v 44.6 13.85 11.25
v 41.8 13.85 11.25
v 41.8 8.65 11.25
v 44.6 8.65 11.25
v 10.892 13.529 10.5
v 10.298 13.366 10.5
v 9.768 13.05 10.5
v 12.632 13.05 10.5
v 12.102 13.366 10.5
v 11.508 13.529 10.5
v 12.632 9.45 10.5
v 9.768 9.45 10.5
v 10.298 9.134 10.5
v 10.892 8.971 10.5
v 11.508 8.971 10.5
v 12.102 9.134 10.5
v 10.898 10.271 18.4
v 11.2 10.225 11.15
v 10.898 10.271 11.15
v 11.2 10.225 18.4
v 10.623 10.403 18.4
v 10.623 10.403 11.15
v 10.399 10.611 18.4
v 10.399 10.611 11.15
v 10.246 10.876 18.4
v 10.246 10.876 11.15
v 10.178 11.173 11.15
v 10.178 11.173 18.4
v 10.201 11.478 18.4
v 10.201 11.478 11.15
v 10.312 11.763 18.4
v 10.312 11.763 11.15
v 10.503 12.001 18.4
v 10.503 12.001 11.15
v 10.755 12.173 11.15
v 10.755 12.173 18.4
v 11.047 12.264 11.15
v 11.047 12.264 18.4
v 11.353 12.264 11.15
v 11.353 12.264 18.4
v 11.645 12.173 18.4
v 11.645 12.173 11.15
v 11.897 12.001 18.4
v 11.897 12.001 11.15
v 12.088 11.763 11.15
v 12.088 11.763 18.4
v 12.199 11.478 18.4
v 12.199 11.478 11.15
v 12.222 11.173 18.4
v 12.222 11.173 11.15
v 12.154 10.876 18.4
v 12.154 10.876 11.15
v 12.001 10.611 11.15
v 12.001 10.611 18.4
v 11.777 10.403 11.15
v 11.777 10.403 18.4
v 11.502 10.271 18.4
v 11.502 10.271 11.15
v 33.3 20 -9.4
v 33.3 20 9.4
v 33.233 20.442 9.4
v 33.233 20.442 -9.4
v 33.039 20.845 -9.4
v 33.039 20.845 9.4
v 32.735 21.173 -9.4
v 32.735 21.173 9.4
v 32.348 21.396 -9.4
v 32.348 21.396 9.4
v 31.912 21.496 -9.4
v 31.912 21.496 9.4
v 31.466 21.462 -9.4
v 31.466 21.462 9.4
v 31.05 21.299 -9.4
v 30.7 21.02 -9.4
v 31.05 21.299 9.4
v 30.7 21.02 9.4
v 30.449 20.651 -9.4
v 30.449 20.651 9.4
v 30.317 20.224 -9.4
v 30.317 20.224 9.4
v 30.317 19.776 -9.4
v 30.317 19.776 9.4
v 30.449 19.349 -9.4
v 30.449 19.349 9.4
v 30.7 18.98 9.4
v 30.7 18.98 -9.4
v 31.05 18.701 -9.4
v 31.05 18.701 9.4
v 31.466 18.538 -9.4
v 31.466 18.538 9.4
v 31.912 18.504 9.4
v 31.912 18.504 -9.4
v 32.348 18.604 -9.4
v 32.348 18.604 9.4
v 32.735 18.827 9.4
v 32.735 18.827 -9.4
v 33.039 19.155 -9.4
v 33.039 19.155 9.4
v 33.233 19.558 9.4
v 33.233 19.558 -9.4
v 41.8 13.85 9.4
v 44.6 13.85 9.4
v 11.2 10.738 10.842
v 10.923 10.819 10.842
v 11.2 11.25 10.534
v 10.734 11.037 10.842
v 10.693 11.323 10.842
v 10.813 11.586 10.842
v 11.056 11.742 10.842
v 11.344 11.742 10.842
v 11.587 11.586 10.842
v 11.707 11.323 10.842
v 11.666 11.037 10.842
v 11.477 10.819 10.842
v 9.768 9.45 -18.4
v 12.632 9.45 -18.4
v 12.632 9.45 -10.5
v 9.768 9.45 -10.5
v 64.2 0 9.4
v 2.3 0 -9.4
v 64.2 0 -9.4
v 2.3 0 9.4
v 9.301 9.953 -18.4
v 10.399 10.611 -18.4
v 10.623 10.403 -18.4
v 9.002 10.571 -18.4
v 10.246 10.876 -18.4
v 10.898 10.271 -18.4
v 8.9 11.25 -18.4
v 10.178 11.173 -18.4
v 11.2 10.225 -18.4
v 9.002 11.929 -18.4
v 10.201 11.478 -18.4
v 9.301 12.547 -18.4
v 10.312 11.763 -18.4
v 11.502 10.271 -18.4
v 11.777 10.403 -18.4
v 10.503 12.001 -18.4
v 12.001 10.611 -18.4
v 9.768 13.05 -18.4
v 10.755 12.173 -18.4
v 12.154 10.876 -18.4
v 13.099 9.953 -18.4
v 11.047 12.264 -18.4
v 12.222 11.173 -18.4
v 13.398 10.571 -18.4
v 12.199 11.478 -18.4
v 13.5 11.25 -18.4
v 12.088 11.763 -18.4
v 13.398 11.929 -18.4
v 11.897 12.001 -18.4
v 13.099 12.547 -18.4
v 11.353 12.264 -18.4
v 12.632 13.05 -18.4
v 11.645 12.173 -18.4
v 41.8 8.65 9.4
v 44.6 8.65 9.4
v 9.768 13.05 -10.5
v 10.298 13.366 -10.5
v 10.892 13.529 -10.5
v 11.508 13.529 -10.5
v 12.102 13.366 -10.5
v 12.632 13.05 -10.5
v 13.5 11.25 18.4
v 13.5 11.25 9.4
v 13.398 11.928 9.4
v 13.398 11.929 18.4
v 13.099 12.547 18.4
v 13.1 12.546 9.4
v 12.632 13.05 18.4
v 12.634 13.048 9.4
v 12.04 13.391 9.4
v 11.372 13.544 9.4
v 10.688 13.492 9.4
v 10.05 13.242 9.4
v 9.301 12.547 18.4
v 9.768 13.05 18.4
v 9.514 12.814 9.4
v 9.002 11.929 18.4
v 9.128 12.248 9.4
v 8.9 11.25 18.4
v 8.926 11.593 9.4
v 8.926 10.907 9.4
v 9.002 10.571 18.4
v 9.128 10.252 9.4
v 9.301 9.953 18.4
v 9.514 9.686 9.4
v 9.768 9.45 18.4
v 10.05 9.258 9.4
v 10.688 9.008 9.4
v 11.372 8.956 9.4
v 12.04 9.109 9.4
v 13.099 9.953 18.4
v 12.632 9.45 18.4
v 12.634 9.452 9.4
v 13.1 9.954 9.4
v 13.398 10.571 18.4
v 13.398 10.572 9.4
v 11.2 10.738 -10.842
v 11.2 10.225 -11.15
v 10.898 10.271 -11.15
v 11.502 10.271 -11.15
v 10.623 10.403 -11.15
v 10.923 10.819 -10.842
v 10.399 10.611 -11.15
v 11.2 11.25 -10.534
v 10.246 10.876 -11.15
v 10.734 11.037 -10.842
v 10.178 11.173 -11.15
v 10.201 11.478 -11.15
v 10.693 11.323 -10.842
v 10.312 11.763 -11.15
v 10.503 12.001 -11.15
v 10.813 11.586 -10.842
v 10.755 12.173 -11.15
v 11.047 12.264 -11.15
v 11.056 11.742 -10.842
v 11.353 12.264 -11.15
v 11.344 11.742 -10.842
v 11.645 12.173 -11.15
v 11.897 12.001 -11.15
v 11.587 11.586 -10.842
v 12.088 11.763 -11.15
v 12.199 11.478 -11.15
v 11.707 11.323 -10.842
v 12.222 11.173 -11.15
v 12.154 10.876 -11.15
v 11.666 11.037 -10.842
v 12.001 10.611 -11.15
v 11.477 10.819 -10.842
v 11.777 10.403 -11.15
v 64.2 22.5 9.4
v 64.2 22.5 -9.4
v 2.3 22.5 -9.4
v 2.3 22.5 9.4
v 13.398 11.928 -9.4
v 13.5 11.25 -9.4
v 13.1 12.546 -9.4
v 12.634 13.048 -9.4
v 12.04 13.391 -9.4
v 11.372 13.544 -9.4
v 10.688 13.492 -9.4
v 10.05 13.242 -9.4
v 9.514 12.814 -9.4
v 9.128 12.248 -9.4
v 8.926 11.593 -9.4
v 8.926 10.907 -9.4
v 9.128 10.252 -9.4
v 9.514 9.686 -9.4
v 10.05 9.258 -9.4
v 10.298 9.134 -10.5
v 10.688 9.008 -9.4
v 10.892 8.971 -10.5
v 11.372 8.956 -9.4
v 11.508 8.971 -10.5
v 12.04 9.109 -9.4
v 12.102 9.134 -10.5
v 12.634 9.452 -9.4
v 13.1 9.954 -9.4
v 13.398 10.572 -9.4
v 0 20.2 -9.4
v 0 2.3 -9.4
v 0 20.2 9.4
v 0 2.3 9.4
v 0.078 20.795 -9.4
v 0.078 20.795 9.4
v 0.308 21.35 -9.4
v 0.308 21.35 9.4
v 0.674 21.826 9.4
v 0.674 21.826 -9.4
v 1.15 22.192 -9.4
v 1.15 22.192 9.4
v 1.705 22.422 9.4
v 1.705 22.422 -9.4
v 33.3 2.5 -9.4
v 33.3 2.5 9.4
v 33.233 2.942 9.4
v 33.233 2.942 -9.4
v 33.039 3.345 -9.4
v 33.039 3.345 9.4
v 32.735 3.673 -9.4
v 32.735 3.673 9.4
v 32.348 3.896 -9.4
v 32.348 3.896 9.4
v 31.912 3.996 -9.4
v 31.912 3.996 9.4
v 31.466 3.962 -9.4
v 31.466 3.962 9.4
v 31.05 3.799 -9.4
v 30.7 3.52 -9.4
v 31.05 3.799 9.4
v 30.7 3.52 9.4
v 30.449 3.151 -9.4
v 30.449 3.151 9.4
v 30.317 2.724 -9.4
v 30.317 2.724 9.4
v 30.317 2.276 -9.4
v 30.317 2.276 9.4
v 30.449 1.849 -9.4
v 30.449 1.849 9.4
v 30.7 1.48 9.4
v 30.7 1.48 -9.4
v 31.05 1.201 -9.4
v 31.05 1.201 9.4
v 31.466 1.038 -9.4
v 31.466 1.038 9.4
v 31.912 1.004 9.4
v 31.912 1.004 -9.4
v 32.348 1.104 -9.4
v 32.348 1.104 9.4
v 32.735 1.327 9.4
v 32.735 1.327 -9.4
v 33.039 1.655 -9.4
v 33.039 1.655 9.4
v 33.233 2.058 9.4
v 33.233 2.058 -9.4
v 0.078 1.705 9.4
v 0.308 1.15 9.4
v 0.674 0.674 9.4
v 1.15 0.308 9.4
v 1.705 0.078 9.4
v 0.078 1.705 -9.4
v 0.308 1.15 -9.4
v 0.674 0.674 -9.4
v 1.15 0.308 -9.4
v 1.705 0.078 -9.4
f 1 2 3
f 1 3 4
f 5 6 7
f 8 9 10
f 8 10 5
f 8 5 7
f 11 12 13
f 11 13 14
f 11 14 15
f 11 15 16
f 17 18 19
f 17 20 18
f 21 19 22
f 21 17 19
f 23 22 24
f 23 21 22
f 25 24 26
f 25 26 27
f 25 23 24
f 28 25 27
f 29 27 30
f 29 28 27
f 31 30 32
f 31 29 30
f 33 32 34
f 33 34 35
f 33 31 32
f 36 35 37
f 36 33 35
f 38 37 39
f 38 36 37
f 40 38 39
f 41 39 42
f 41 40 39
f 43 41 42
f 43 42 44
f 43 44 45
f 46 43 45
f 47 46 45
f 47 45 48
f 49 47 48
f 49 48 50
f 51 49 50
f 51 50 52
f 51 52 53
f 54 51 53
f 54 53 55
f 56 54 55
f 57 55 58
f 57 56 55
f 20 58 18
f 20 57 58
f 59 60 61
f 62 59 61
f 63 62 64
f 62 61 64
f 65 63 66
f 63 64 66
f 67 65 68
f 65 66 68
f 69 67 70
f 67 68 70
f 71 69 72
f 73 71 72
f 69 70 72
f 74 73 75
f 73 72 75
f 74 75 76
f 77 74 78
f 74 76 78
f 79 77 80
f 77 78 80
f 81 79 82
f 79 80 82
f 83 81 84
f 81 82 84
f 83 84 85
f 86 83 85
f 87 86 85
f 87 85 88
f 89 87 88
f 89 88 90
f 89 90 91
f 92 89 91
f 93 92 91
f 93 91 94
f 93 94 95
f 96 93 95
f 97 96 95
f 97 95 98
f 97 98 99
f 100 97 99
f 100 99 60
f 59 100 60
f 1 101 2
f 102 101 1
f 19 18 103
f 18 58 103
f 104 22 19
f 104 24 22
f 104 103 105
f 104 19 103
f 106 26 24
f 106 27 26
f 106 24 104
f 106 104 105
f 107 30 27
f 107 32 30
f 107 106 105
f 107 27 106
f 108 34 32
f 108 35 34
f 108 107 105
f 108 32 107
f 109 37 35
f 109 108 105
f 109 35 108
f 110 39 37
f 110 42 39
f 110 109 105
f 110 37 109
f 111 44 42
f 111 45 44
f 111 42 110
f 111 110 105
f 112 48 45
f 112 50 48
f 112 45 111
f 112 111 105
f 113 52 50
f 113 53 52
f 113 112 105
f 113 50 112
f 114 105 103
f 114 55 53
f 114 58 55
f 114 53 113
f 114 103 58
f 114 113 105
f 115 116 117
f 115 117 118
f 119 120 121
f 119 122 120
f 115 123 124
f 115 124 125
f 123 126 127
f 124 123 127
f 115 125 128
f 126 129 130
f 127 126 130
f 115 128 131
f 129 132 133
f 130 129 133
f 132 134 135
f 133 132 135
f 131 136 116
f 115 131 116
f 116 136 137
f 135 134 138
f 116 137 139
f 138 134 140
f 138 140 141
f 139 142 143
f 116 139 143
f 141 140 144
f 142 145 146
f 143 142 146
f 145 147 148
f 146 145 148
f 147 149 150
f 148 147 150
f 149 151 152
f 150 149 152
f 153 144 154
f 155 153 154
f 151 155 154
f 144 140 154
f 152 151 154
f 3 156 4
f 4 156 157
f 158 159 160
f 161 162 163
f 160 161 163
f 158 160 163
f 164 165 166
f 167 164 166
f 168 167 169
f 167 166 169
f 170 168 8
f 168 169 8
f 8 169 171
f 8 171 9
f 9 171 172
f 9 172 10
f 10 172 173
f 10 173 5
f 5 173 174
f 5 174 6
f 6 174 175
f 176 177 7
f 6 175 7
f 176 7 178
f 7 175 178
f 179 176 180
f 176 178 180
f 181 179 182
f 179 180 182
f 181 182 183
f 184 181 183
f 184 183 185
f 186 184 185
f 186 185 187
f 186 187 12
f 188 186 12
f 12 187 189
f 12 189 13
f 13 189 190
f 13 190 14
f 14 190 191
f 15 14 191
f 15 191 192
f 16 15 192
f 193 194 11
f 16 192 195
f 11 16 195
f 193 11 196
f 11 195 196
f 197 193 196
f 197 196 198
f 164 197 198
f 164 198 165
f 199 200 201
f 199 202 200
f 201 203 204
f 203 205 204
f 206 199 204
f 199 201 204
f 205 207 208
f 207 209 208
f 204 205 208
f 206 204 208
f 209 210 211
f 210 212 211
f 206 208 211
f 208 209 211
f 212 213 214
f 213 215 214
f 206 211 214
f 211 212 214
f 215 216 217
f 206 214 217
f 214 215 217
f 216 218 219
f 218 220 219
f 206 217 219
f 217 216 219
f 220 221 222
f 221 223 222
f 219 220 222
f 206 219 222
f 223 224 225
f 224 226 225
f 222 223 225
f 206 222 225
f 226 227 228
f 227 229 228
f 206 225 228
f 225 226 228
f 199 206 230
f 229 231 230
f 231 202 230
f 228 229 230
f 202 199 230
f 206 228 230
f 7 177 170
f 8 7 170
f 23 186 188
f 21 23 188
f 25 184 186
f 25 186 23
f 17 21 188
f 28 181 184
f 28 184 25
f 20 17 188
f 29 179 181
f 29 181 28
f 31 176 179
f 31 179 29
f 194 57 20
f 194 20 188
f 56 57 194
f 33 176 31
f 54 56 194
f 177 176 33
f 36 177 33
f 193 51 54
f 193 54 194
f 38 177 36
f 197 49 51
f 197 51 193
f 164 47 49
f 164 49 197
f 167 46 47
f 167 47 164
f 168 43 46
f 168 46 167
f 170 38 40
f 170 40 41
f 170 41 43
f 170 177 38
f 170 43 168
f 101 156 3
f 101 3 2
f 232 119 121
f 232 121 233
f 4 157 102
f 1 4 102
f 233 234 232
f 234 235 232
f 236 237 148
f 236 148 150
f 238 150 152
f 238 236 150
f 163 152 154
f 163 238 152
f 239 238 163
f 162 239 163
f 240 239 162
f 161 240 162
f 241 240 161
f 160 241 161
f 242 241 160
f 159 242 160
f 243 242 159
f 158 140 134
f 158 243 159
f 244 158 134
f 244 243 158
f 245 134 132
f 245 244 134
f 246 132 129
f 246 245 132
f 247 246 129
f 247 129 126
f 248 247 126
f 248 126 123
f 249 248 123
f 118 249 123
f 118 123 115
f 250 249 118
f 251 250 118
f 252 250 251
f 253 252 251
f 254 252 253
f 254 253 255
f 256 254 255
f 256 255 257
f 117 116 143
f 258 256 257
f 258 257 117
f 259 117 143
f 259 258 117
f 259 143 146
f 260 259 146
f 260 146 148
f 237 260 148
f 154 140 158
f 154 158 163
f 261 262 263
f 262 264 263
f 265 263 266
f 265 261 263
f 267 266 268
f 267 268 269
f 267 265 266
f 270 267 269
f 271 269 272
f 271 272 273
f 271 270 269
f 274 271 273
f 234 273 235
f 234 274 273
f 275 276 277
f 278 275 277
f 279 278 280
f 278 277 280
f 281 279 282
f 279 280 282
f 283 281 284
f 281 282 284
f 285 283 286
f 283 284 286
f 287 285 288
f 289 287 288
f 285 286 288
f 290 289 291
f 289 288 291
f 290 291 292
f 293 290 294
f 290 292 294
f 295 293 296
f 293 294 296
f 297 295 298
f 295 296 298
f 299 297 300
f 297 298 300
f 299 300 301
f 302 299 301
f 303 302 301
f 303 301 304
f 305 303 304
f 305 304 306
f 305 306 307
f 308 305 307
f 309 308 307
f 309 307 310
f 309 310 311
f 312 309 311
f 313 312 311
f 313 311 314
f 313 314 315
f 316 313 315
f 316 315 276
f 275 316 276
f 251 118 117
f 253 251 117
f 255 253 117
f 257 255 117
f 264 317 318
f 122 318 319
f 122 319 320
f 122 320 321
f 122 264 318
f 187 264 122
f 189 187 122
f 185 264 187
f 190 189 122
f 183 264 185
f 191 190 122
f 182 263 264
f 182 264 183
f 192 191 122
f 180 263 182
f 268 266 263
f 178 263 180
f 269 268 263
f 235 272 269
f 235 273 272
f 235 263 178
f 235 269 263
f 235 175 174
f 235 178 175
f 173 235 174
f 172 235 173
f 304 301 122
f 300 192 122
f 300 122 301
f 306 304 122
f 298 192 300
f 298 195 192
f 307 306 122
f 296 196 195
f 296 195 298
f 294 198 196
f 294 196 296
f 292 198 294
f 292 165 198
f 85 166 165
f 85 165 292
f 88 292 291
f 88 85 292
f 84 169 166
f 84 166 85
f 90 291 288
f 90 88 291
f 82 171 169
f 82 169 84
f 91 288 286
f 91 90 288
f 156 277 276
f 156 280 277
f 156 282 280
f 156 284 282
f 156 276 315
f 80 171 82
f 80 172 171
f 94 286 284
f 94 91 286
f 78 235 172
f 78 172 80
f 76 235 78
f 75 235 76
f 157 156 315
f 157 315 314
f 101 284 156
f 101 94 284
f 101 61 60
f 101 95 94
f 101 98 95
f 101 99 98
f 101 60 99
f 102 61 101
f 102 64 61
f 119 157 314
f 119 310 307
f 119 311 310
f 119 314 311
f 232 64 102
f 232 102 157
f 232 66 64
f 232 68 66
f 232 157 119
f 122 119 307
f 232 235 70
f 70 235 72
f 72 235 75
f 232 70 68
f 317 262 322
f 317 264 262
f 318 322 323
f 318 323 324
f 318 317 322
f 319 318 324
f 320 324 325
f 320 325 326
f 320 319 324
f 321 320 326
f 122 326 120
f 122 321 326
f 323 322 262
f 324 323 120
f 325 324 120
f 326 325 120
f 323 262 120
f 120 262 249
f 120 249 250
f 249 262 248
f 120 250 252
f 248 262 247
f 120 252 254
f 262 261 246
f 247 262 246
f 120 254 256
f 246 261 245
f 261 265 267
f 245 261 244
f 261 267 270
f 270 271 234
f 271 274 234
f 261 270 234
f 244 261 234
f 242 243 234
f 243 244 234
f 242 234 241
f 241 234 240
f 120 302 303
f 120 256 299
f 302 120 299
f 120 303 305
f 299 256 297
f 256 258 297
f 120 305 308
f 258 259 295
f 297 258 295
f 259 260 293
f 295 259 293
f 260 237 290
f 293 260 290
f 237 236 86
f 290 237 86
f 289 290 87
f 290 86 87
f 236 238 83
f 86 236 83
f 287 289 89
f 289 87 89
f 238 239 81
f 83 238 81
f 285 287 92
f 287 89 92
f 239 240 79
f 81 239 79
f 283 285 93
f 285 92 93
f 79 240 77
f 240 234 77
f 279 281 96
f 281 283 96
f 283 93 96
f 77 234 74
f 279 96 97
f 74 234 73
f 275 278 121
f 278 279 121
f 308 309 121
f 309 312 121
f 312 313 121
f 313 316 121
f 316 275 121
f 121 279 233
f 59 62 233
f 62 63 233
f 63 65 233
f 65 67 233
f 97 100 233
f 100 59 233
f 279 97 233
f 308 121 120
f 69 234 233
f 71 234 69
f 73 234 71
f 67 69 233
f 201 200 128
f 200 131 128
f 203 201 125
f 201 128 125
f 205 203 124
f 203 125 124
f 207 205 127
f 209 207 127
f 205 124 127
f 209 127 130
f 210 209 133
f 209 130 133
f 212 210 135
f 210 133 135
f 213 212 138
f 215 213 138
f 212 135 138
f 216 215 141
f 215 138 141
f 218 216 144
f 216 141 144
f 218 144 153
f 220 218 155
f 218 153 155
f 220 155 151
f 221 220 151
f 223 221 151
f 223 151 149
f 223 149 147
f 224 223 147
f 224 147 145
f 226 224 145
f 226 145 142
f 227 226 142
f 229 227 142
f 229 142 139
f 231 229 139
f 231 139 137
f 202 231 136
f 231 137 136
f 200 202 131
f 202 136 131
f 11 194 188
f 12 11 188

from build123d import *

# Parameters (mm, degrees)
ESBO_O1_W                = 64.2
ESBO_O1_H                = 22.5
RESSALTO_EXTRUS_O1_DEPTH = 9.4
ESBO_O2_R                = 2.3
RESSALTO_EXTRUS_O2_DEPTH = 9
CORTE_EXTRUS_O1_DEPTH    = 7.9
ESBO_O4_R                = 1.5
CORTE_EXTRUS_O2_DEPTH    = 19.8
FILETE1_R                = 2.3
ESBO_O5_W                = 2.8
ESBO_O5_H                = 5.2
RESSALTO_EXTRUS_O3_DEPTH = 1.85


with BuildPart() as part:
    # Esboço1 → Ressalto-extrusão1 (new body, symmetric)
    with BuildSketch(Plane.XY):
        with Locations((32.1, 11.25)):
            Rectangle(ESBO_O1_W, ESBO_O1_H)
    extrude(amount=RESSALTO_EXTRUS_O1_DEPTH, both=True)

    # Esboço2 → Ressalto-extrusão2 (add)
    with BuildSketch(Plane.XY.offset(9.4)):
        with Locations((11.2, 11.25)):
            Circle(ESBO_O2_R)
    ressalto_extrus_o2 = extrude(amount=RESSALTO_EXTRUS_O2_DEPTH)

    # Esboço3 → Corte-extrusão1 (cut)
    with BuildSketch(Plane.XY.offset(18.4)):
        with BuildLine():
            Line((9.768217894, 13.05), (12.631782106, 13.05))
            ThreePointArc((12.631782106, 13.05), (11.2, 13.55), (9.768217894, 13.05))
        make_face()
        with BuildLine():
            Line((12.631782106, 9.45), (9.768217894, 9.45))
            ThreePointArc((9.768217894, 9.45), (11.2, 8.95), (12.631782106, 9.45))
        make_face()
    corte_extrus_o1 = extrude(amount=-CORTE_EXTRUS_O1_DEPTH, mode=Mode.SUBTRACT)

    # Esboço4 → Corte-extrusão2 (cut, through all)
    with BuildSketch(Plane.XY.offset(9.4)):
        with Locations((31.8, 20)):
            Circle(ESBO_O4_R)
        with Locations((31.8, 2.5)):
            Circle(ESBO_O4_R)
    extrude(amount=-CORTE_EXTRUS_O2_DEPTH, mode=Mode.SUBTRACT)

    # Esboço6 → Furo roscado de M2.51 (revolve, cut)
    with BuildSketch(Plane(origin=(11.2, 11.25, 18.4), x_dir=(0, -1, 0), z_dir=(1, 0, 0))):
        Polygon((0, 0), (0, 7.865882135), (1.025, 7.25), (1.025, 0), align=None)
    furo_roscado_de_m2_51 = revolve(axis=Axis((11.2, 11.25, 24.75), (0, 0, -1)), mode=Mode.SUBTRACT)

    # Espelhar1: Ressalto-extrusão2, Corte-extrusão1, Furo roscado de M2.51 across plane
    add(ressalto_extrus_o2.mirror(Plane.XY))
    add(corte_extrus_o1.mirror(Plane.XY), mode=Mode.SUBTRACT)
    add(furo_roscado_de_m2_51.mirror(Plane.XY), mode=Mode.SUBTRACT)

    # Filete1
    filete1_edges = [part.edges().sort_by_distance(p)[0] for p in [
        (0, 22.5, 0),
        (0, 0, 0),
    ]]
    fillet(filete1_edges, radius=FILETE1_R)

    # Esboço5 → Ressalto-extrusão3 (add)
    with BuildSketch(Plane.XY.offset(9.4)):
        with Locations((43.2, 11.25)):
            Rectangle(ESBO_O5_W, ESBO_O5_H)
    extrude(amount=RESSALTO_EXTRUS_O3_DEPTH)


solid = part.part
